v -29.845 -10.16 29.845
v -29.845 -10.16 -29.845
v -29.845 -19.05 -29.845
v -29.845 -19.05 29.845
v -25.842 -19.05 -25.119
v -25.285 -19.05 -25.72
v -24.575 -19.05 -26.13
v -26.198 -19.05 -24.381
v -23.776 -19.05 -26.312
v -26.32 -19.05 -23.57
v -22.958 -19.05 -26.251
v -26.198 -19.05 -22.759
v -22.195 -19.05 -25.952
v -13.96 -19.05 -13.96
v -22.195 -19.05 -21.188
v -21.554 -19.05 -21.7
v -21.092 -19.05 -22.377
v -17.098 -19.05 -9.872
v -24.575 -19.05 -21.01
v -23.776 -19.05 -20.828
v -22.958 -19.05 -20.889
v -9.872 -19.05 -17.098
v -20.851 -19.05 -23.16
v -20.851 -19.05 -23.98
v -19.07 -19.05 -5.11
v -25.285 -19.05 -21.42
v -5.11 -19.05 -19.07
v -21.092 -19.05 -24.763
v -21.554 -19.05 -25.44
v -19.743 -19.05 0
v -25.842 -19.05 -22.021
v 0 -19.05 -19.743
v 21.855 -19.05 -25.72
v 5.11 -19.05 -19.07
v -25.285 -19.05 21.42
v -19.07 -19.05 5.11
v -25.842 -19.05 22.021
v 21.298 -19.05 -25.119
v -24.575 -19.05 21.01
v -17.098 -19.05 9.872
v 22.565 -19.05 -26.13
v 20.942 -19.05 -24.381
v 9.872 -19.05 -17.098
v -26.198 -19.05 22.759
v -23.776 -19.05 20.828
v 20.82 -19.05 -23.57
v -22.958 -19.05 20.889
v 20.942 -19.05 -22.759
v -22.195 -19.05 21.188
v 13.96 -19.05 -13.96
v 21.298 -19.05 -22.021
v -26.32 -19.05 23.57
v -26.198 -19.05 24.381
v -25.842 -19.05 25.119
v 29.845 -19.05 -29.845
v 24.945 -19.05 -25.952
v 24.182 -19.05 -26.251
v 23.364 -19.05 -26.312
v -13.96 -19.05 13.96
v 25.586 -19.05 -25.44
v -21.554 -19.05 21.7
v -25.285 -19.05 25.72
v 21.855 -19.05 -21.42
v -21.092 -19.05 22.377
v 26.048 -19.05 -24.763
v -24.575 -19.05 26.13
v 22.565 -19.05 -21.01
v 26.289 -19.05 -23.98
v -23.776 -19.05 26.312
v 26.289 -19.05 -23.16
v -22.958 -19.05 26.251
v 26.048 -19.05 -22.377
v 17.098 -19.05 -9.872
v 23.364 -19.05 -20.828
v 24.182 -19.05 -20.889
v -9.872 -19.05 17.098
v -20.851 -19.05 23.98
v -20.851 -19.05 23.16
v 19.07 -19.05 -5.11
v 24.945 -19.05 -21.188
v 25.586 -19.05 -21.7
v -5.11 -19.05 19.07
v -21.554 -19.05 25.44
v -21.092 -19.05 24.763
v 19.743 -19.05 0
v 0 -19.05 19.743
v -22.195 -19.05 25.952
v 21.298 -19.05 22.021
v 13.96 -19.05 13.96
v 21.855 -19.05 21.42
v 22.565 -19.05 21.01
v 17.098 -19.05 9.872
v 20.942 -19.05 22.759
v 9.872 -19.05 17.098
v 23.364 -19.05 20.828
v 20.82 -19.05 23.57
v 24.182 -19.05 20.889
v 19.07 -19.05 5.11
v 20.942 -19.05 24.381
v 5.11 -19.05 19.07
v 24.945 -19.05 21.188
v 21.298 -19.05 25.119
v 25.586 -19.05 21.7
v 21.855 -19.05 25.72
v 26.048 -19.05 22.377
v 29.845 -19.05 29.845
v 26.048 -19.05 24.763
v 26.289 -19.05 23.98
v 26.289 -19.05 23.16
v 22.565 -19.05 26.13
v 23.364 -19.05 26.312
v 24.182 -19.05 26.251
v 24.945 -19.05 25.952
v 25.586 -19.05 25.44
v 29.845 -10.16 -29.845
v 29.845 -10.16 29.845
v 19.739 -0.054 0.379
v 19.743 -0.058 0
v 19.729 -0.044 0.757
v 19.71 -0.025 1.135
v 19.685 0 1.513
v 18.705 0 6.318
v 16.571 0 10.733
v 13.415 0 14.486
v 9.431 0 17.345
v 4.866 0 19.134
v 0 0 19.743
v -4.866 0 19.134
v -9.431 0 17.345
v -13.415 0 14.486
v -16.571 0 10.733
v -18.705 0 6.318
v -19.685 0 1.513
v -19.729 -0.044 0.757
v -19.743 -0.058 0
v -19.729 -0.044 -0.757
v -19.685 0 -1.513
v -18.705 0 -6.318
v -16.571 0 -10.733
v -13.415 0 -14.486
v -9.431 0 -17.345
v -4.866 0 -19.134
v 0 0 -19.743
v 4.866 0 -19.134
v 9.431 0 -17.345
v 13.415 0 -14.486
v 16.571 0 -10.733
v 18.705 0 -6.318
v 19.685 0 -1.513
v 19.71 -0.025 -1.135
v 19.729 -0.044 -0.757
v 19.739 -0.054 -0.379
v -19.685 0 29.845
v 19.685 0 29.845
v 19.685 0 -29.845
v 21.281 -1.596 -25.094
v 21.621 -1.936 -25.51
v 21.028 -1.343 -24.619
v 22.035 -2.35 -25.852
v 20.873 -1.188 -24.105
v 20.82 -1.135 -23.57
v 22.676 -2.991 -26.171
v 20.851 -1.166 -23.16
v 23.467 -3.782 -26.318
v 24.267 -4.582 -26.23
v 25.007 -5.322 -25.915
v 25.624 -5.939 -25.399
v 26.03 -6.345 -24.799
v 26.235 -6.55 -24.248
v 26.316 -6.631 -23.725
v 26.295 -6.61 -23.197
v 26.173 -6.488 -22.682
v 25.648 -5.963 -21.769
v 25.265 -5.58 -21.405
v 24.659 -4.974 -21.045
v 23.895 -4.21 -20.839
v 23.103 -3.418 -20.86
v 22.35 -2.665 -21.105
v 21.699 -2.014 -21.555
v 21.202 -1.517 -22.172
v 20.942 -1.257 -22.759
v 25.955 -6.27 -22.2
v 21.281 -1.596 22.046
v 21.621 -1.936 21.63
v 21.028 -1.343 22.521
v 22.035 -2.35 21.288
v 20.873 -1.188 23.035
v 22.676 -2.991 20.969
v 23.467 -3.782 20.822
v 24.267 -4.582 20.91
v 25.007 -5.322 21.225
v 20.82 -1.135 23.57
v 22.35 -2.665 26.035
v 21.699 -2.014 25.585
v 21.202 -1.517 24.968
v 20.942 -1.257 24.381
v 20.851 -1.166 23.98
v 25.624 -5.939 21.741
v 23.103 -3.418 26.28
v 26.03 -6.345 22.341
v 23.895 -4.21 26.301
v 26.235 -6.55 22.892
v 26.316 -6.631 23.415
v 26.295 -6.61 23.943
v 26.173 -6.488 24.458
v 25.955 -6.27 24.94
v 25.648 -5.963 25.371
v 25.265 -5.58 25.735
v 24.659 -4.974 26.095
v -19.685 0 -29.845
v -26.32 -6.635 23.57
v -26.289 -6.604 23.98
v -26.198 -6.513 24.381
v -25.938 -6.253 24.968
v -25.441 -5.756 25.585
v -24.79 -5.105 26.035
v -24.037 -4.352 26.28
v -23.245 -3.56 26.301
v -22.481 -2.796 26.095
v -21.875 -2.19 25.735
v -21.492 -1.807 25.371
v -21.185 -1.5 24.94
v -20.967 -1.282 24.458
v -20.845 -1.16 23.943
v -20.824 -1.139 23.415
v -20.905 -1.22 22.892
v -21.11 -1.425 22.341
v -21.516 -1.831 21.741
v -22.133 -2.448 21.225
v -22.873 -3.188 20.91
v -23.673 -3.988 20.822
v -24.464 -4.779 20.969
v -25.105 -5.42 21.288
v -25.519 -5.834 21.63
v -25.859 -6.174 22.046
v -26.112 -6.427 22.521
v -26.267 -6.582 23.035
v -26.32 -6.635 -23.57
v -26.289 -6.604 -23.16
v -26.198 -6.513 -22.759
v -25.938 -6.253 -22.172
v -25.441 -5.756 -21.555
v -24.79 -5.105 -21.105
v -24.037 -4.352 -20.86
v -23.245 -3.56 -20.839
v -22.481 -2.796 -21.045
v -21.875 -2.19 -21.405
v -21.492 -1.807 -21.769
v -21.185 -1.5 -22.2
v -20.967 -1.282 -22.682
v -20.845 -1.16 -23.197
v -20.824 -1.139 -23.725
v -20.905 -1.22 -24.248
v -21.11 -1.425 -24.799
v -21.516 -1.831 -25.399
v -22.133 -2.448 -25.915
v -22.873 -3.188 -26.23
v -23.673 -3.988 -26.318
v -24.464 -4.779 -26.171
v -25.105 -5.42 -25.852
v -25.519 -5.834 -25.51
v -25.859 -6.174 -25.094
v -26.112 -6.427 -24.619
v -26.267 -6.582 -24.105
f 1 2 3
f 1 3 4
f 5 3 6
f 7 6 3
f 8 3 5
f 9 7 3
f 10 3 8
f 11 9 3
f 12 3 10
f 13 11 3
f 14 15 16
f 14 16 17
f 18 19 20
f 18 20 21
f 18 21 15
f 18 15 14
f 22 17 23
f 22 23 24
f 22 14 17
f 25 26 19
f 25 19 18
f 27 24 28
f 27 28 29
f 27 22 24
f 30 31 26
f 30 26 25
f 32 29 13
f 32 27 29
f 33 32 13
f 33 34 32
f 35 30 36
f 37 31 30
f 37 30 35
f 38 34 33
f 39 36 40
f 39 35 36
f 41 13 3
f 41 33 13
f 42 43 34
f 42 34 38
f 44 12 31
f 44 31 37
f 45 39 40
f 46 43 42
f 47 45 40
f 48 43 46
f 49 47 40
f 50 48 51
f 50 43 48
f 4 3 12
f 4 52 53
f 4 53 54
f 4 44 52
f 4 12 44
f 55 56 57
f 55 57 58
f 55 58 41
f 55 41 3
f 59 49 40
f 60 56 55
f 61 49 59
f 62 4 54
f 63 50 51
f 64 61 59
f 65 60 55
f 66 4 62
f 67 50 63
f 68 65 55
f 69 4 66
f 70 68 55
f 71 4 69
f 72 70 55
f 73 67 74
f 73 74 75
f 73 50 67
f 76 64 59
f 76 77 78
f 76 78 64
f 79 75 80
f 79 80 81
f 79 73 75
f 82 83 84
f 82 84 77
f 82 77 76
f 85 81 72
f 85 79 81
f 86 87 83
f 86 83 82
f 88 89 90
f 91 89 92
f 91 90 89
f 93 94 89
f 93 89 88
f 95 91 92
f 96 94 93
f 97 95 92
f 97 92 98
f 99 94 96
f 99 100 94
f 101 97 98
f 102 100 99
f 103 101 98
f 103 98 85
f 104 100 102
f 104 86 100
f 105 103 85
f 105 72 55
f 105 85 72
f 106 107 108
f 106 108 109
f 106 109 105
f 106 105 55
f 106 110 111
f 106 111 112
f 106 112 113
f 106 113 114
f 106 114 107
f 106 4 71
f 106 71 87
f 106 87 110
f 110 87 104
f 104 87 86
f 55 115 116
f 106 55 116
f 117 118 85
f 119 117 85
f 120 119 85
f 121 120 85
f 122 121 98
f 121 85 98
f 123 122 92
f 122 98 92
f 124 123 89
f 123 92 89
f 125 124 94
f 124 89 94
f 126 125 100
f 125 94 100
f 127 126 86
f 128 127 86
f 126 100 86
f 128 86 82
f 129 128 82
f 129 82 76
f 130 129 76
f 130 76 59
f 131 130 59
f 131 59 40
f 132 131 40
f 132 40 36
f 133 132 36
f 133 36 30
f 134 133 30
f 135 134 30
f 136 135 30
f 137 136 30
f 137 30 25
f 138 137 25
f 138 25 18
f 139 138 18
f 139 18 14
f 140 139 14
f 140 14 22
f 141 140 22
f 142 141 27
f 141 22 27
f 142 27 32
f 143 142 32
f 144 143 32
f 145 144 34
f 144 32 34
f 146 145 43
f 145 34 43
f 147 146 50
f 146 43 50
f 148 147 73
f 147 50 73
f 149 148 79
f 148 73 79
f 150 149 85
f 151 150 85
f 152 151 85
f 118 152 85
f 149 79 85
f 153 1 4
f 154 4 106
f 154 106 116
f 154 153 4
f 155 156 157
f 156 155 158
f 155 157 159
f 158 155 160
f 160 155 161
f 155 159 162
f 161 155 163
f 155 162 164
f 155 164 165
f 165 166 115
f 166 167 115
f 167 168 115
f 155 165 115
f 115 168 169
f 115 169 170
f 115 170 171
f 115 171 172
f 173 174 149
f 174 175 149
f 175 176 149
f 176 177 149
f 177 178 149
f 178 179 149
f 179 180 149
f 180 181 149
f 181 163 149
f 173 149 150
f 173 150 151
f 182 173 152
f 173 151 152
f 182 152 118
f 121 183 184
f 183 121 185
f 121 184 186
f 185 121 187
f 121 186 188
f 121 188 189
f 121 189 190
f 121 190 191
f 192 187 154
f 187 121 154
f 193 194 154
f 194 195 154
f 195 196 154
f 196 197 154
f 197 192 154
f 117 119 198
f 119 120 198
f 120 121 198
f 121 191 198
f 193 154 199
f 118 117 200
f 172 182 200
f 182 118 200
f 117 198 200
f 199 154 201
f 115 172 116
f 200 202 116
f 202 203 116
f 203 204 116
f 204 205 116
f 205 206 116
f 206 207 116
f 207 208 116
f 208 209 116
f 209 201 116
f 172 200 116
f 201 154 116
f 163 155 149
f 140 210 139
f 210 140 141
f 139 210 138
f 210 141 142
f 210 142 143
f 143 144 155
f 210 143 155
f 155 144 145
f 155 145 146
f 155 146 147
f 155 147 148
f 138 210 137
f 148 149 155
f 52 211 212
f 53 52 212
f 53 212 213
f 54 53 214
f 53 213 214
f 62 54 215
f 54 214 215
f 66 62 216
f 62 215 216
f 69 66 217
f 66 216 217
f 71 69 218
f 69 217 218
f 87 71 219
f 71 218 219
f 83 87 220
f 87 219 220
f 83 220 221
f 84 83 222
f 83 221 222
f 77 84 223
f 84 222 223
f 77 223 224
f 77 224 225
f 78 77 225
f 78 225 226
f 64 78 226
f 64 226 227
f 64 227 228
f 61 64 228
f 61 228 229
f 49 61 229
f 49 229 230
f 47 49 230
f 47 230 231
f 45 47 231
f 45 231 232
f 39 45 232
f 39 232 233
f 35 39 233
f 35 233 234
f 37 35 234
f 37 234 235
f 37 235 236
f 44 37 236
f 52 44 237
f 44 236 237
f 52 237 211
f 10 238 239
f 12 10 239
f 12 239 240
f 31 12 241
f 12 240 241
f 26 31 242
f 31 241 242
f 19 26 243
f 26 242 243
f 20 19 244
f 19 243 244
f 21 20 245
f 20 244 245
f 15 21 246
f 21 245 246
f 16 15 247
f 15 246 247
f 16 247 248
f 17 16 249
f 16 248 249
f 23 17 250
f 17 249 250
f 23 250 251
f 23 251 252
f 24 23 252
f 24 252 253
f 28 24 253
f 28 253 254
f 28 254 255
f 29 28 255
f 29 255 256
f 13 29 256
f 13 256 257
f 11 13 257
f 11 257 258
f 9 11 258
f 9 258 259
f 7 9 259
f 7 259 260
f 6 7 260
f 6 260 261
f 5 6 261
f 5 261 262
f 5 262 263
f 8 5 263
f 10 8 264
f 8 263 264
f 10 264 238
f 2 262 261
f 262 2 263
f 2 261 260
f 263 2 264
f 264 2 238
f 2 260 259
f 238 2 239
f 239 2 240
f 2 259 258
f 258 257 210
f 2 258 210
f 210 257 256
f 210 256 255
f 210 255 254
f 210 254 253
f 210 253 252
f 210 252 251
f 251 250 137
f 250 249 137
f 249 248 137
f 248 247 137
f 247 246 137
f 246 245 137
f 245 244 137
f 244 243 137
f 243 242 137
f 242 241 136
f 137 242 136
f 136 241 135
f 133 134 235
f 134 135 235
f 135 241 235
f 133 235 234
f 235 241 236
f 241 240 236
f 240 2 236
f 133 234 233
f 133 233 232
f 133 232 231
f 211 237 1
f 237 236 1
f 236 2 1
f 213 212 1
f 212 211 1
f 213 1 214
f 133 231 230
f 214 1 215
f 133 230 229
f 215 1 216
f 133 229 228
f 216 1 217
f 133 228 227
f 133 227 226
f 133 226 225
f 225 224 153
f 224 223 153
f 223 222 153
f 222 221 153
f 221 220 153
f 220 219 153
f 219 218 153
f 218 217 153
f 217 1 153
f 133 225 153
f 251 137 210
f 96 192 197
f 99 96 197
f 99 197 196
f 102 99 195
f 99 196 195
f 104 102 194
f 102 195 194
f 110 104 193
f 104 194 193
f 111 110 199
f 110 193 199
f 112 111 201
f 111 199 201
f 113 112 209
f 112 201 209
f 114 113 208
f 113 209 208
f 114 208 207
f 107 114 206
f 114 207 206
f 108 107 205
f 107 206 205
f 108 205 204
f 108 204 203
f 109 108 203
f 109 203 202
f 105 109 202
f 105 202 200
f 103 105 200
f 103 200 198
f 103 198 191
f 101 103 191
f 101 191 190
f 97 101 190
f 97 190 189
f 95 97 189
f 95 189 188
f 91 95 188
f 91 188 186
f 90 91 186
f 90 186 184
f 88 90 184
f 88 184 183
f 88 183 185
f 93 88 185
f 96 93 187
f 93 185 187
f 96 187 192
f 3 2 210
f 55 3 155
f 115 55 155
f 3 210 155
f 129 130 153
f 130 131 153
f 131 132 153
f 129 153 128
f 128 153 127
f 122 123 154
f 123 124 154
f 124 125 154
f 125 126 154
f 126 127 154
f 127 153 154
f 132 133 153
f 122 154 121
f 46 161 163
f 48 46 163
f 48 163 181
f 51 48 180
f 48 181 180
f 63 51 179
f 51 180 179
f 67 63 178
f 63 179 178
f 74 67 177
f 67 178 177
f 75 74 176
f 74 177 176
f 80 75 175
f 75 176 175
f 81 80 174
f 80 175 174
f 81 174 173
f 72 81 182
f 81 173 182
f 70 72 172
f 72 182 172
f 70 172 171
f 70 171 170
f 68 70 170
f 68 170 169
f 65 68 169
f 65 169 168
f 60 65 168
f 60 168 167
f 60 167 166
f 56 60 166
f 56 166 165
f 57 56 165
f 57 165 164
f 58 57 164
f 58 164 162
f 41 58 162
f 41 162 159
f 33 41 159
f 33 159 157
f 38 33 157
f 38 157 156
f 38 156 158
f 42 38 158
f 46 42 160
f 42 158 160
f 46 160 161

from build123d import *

# Parameters (mm, degrees)
F0_W     = 59.69
F0_H     = 59.69
F1_DEPTH = 19.05
F2_R     = 19.7430645089
F3_DEPTH = 25.4
F5_D     = 5.5
F8_DEPTH = 59.691


with BuildPart() as f1:
    # F0 (on Front) → F1 (new body)
    with BuildSketch(Plane.XZ):
        Rectangle(F0_W, F0_H)
    extrude(amount=F1_DEPTH)

    # F2 (on face) → F3 (cut)
    with BuildSketch(Plane.XZ.offset(19.05)):
        Circle(F2_R)
    extrude(amount=-F3_DEPTH, mode=Mode.SUBTRACT)

    # F5 (through all)
    with Locations(Plane.XZ.offset(19.05)):
        with Locations((-23.57, 23.57), (23.57, 23.57), (23.57, -23.57), (-23.57, -23.57)):
            Hole(F5_D / 2)

    # F7 (on face) → F8 (cut, through all)
    with BuildSketch(Plane.XY.offset(29.845)):
        Polygon((-29.845, 0), (-29.845, -10.16), (-19.685, 0), align=None)
        Polygon((19.685, 0), (29.845, -10.16), (29.845, 0), align=None)
    extrude(amount=-F8_DEPTH, mode=Mode.SUBTRACT)


solid = f1.part
